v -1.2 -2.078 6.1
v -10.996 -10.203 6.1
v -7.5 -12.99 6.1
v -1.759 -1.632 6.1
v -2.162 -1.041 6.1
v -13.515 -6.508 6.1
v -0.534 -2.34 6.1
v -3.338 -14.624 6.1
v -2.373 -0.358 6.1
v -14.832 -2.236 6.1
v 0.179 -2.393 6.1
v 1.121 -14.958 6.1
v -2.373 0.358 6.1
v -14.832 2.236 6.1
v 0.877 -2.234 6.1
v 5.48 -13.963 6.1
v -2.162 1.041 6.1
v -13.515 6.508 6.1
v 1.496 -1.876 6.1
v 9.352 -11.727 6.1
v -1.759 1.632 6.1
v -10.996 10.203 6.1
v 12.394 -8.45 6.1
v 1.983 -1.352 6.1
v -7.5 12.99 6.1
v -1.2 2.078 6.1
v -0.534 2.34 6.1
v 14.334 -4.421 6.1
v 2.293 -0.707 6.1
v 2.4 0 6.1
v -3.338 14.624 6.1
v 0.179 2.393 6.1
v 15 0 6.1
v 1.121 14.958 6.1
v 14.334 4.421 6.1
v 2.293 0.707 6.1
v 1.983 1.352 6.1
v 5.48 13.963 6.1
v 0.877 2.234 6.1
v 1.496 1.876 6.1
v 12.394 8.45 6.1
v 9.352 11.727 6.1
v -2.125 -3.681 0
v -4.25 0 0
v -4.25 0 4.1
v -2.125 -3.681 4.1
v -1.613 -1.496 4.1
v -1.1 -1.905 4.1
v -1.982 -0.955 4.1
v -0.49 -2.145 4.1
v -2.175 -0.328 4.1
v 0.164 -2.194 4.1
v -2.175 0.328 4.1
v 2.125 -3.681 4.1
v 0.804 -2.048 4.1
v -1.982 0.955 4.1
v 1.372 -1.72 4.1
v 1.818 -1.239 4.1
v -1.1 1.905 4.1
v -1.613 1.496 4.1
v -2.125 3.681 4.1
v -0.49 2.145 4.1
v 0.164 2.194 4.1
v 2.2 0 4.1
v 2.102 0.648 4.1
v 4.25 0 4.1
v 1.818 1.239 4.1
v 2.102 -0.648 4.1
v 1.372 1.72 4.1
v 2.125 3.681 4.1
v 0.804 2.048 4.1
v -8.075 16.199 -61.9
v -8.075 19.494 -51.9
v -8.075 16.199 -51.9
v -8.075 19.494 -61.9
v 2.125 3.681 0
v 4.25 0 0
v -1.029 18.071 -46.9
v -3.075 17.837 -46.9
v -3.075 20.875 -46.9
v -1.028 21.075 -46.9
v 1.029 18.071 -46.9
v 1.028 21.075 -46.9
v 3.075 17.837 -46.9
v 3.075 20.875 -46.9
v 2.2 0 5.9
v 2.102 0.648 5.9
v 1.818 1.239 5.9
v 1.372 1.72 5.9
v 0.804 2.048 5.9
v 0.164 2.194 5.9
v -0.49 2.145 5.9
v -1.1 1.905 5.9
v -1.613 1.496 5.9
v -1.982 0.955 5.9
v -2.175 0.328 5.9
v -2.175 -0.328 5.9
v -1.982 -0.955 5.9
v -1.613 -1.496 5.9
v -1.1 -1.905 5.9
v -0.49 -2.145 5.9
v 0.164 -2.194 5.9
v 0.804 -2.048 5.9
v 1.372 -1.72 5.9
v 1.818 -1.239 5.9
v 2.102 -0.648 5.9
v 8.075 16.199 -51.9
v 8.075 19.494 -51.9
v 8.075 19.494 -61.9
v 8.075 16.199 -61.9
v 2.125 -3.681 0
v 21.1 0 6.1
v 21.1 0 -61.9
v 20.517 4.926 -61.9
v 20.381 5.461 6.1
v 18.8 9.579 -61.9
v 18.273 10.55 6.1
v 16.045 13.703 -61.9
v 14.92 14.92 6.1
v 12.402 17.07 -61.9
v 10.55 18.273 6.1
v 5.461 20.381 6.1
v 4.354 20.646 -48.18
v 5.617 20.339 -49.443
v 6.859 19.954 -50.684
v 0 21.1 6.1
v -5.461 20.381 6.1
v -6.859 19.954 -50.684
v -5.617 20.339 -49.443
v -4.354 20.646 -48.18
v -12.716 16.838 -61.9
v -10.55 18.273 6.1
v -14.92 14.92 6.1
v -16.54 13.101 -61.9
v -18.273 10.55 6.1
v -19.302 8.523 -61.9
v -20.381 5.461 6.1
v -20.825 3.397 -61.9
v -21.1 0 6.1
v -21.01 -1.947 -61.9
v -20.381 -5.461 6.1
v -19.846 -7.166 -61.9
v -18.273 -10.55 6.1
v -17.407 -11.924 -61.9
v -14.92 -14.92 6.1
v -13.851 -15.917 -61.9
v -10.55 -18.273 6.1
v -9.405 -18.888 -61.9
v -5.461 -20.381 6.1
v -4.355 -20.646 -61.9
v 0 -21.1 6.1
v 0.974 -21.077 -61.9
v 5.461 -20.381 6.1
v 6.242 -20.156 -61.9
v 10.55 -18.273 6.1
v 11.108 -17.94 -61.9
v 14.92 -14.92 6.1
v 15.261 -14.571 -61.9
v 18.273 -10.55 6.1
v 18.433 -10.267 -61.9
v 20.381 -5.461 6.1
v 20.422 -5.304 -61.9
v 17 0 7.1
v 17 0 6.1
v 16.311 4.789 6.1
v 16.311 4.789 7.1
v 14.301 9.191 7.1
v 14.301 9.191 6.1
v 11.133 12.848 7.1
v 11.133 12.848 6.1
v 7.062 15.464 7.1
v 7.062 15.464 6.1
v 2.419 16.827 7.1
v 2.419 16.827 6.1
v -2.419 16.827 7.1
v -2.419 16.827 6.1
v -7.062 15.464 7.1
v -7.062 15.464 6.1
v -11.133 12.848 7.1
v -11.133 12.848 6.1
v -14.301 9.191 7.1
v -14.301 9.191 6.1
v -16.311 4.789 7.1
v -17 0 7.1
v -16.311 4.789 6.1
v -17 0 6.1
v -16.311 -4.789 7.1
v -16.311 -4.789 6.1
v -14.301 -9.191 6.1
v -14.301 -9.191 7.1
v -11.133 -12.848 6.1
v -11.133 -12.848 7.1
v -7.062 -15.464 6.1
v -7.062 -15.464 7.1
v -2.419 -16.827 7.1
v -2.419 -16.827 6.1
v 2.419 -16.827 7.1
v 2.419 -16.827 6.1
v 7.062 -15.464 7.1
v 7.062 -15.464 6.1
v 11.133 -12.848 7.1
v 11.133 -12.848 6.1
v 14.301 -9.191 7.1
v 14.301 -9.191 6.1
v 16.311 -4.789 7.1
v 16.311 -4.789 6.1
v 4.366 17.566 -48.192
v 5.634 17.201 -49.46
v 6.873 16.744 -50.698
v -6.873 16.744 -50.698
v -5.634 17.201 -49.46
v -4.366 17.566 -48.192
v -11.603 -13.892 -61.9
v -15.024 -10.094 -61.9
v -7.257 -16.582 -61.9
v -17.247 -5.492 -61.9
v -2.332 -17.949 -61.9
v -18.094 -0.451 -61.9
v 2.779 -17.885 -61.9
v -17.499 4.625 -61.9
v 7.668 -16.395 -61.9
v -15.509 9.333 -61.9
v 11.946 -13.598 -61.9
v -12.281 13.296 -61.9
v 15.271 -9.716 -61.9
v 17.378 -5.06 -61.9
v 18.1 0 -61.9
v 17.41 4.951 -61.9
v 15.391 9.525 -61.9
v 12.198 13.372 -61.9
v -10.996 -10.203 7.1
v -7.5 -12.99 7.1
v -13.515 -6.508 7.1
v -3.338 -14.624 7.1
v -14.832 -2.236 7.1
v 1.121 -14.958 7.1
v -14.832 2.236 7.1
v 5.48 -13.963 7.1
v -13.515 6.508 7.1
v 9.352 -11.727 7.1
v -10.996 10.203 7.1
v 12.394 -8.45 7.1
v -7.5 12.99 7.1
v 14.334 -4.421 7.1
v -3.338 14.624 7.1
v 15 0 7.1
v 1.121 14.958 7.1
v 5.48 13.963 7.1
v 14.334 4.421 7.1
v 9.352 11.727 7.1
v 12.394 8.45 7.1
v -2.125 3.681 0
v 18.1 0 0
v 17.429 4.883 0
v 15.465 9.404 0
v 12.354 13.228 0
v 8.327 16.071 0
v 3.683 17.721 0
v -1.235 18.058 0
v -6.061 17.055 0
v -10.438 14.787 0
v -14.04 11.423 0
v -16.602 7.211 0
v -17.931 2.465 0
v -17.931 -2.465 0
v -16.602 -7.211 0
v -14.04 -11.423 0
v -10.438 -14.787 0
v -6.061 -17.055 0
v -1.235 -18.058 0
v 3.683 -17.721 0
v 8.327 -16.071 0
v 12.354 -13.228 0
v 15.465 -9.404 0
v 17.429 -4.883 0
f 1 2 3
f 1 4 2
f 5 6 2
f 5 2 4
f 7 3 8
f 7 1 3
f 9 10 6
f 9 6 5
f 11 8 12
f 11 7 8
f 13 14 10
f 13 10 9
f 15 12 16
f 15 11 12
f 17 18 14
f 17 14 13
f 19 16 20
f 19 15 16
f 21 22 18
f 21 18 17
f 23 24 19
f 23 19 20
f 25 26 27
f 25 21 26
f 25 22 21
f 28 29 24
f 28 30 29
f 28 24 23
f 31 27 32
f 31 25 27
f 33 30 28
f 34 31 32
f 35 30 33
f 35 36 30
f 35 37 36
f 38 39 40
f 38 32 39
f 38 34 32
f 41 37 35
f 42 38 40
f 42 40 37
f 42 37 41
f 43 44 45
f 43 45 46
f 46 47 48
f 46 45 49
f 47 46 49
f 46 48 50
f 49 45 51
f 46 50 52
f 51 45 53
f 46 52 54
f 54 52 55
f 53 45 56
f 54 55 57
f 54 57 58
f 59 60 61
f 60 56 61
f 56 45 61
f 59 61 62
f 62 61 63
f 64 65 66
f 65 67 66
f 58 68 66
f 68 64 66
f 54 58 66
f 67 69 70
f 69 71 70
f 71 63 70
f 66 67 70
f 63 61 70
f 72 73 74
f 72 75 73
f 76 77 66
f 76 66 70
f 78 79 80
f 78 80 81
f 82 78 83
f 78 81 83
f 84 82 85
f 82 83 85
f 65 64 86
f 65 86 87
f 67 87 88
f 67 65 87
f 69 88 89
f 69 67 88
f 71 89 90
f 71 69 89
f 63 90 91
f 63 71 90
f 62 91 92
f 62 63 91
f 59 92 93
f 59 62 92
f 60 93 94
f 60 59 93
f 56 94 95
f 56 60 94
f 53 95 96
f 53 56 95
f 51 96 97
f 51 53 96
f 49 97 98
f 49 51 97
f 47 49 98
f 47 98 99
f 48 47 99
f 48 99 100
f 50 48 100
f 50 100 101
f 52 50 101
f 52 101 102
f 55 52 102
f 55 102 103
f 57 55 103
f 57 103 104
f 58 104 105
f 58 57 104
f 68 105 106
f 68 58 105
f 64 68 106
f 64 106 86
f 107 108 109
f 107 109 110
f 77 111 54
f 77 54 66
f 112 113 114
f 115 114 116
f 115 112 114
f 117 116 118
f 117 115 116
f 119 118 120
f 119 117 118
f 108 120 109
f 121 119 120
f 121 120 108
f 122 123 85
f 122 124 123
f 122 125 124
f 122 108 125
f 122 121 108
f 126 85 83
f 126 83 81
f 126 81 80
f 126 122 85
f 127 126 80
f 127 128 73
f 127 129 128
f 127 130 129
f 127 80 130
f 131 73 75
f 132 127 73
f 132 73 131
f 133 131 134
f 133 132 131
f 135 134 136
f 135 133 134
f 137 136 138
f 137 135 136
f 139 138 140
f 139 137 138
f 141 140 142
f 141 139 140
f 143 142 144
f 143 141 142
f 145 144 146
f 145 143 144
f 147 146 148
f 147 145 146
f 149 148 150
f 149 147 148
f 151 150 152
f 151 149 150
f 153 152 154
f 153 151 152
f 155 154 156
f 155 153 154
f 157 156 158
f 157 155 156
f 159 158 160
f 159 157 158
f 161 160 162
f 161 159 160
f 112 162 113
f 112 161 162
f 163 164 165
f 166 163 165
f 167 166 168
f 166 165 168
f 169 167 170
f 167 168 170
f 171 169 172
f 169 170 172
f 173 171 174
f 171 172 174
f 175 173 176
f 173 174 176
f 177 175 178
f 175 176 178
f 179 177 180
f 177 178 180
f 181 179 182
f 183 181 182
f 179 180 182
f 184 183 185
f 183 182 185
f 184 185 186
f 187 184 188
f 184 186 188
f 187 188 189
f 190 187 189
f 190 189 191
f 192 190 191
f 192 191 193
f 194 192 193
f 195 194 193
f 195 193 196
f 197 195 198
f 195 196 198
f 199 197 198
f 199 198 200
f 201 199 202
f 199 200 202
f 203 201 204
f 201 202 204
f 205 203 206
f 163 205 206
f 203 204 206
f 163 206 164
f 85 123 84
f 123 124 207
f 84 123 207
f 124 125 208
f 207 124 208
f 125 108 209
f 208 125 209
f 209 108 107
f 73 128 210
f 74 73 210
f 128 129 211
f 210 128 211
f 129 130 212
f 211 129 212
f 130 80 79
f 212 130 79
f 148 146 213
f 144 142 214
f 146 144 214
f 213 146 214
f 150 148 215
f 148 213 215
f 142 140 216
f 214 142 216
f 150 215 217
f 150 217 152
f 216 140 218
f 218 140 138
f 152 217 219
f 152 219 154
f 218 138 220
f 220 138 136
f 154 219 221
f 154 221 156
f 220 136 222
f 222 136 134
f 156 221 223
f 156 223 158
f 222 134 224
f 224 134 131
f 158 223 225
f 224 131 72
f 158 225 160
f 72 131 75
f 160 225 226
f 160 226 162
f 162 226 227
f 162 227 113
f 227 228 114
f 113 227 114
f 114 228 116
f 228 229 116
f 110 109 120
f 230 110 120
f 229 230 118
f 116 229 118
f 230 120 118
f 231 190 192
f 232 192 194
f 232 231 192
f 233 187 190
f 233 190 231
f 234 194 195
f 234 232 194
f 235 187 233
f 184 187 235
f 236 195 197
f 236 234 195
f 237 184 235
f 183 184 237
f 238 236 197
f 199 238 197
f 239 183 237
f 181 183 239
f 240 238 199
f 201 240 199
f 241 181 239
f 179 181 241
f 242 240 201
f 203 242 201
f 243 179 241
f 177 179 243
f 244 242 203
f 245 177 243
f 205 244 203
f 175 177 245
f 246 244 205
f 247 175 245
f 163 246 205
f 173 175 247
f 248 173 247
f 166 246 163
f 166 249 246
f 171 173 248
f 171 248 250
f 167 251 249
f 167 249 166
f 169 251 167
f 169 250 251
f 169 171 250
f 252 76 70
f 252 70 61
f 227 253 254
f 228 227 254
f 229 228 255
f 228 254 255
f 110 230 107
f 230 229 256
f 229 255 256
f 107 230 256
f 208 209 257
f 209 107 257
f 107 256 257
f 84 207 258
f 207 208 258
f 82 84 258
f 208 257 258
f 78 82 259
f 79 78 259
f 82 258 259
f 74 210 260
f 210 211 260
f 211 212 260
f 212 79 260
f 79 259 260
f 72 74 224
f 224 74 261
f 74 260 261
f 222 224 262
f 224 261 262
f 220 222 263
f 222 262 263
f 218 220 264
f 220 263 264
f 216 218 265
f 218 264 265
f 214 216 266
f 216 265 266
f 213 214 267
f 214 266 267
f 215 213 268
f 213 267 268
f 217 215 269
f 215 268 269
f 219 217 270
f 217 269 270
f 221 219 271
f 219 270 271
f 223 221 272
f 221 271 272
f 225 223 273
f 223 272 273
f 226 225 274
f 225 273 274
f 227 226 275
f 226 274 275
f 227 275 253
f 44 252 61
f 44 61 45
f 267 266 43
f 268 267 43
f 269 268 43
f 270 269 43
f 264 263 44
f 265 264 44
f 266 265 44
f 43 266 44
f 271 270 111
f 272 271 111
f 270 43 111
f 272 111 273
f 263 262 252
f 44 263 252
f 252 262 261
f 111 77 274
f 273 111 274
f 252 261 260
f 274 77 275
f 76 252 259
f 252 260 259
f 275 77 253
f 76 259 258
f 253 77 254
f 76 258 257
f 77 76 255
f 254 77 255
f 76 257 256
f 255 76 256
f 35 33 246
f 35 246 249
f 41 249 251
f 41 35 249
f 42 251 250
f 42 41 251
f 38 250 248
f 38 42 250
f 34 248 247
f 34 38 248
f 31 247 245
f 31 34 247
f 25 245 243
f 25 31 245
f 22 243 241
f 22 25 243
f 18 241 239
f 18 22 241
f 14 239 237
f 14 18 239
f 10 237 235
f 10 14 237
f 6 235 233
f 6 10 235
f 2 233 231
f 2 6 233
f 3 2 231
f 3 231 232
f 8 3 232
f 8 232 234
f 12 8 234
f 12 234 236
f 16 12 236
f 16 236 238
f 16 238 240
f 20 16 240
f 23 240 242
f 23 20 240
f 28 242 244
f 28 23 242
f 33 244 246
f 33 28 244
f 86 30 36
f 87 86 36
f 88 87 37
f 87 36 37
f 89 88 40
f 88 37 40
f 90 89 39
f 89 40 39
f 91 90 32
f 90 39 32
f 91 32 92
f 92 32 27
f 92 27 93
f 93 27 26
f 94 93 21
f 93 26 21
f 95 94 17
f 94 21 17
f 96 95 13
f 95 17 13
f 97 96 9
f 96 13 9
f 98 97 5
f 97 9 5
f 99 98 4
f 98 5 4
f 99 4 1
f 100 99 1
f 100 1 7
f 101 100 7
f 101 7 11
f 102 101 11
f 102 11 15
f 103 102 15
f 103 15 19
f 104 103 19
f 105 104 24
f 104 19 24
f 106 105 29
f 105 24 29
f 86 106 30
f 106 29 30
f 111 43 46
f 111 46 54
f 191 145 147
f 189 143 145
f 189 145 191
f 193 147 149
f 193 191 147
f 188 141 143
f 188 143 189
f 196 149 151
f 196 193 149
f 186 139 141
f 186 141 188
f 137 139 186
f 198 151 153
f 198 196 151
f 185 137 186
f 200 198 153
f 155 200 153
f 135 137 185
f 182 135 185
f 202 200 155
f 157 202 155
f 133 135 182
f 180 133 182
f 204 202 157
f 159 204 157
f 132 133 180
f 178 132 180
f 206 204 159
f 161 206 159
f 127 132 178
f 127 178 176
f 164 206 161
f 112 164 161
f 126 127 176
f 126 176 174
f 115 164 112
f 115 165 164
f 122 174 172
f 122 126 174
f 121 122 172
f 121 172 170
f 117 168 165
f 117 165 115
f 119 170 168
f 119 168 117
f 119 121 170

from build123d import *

# Parameters (mm, degrees)
SKETCH013_R     = 21.1
PAD004_DEPTH    = 4.1
SKETCH014_R     = 21.1
SKETCH014_R_2   = 2.2
PAD005_DEPTH    = 2
SKETCH012_R     = 17
SKETCH012_R_2   = 15
PAD006_DEPTH    = 1
CHAMFER003_SIZE = 0.2
SKETCH015_R     = 21.1
SKETCH015_R_2   = 18.1
PAD007_DEPTH    = 61.9
POCKET007_DEPTH = 15
CHAMFER004_SIZE = 5


with BuildPart() as part:
    # Sketch013 → Pad004 (new body)
    with BuildSketch(Plane.XY):
        Circle(SKETCH013_R)
        Polygon((2.125, -3.680608), (4.25, 0), (2.125, 3.680608), (-2.125, 3.680608), (-4.25, 0), (-2.125, -3.680608), align=None, mode=Mode.SUBTRACT)
    extrude(amount=PAD004_DEPTH)

    # Sketch014 → Pad005 (join)
    with BuildSketch(Plane.XY.offset(4.1)):
        Circle(SKETCH014_R)
        Circle(SKETCH014_R_2, mode=Mode.SUBTRACT)
    extrude(amount=PAD005_DEPTH)

    # Sketch012 → Pad006 (join)
    with BuildSketch(Plane.XY.offset(6.1)):
        Circle(SKETCH012_R)
        Circle(SKETCH012_R_2, mode=Mode.SUBTRACT)
    extrude(amount=PAD006_DEPTH)

    # Chamfer003
    chamfer003_edges = [part.edges().sort_by_distance(p)[0] for p in [
        (-2.2, 0, 6.1),
        (15, 0, 6.6),
    ]]
    chamfer(chamfer003_edges, length=CHAMFER003_SIZE)

    # Sketch015 → Pad007 (join)
    with BuildSketch(Plane.XY):
        Circle(SKETCH015_R)
        Circle(SKETCH015_R_2, mode=Mode.SUBTRACT)
    extrude(amount=-PAD007_DEPTH)

    # Sketch016 → Pocket007 (cut)
    with BuildSketch(Plane.XY.offset(-61.9)):
        with BuildLine():
            ThreePointArc((8.07462, 19.493858), (0, 21.1), (-8.07462, 19.493858))
            Line((-8.07462, 19.493858), (-8.07462, 16.19909))
            ThreePointArc((8.07462, 16.19909), (0, 18.1), (-8.07462, 16.19909))
            Line((8.07462, 19.493858), (8.07462, 16.19909))
        make_face()
    extrude(amount=POCKET007_DEPTH, mode=Mode.SUBTRACT)

    # Chamfer004
    chamfer004_edges = [part.edges().sort_by_distance(p)[0] for p in [
        (8.07462, 17.846474, -46.9),
        (-8.07462, 17.846474, -46.9),
    ]]
    chamfer(chamfer004_edges, length=CHAMFER004_SIZE)


solid = part.part
